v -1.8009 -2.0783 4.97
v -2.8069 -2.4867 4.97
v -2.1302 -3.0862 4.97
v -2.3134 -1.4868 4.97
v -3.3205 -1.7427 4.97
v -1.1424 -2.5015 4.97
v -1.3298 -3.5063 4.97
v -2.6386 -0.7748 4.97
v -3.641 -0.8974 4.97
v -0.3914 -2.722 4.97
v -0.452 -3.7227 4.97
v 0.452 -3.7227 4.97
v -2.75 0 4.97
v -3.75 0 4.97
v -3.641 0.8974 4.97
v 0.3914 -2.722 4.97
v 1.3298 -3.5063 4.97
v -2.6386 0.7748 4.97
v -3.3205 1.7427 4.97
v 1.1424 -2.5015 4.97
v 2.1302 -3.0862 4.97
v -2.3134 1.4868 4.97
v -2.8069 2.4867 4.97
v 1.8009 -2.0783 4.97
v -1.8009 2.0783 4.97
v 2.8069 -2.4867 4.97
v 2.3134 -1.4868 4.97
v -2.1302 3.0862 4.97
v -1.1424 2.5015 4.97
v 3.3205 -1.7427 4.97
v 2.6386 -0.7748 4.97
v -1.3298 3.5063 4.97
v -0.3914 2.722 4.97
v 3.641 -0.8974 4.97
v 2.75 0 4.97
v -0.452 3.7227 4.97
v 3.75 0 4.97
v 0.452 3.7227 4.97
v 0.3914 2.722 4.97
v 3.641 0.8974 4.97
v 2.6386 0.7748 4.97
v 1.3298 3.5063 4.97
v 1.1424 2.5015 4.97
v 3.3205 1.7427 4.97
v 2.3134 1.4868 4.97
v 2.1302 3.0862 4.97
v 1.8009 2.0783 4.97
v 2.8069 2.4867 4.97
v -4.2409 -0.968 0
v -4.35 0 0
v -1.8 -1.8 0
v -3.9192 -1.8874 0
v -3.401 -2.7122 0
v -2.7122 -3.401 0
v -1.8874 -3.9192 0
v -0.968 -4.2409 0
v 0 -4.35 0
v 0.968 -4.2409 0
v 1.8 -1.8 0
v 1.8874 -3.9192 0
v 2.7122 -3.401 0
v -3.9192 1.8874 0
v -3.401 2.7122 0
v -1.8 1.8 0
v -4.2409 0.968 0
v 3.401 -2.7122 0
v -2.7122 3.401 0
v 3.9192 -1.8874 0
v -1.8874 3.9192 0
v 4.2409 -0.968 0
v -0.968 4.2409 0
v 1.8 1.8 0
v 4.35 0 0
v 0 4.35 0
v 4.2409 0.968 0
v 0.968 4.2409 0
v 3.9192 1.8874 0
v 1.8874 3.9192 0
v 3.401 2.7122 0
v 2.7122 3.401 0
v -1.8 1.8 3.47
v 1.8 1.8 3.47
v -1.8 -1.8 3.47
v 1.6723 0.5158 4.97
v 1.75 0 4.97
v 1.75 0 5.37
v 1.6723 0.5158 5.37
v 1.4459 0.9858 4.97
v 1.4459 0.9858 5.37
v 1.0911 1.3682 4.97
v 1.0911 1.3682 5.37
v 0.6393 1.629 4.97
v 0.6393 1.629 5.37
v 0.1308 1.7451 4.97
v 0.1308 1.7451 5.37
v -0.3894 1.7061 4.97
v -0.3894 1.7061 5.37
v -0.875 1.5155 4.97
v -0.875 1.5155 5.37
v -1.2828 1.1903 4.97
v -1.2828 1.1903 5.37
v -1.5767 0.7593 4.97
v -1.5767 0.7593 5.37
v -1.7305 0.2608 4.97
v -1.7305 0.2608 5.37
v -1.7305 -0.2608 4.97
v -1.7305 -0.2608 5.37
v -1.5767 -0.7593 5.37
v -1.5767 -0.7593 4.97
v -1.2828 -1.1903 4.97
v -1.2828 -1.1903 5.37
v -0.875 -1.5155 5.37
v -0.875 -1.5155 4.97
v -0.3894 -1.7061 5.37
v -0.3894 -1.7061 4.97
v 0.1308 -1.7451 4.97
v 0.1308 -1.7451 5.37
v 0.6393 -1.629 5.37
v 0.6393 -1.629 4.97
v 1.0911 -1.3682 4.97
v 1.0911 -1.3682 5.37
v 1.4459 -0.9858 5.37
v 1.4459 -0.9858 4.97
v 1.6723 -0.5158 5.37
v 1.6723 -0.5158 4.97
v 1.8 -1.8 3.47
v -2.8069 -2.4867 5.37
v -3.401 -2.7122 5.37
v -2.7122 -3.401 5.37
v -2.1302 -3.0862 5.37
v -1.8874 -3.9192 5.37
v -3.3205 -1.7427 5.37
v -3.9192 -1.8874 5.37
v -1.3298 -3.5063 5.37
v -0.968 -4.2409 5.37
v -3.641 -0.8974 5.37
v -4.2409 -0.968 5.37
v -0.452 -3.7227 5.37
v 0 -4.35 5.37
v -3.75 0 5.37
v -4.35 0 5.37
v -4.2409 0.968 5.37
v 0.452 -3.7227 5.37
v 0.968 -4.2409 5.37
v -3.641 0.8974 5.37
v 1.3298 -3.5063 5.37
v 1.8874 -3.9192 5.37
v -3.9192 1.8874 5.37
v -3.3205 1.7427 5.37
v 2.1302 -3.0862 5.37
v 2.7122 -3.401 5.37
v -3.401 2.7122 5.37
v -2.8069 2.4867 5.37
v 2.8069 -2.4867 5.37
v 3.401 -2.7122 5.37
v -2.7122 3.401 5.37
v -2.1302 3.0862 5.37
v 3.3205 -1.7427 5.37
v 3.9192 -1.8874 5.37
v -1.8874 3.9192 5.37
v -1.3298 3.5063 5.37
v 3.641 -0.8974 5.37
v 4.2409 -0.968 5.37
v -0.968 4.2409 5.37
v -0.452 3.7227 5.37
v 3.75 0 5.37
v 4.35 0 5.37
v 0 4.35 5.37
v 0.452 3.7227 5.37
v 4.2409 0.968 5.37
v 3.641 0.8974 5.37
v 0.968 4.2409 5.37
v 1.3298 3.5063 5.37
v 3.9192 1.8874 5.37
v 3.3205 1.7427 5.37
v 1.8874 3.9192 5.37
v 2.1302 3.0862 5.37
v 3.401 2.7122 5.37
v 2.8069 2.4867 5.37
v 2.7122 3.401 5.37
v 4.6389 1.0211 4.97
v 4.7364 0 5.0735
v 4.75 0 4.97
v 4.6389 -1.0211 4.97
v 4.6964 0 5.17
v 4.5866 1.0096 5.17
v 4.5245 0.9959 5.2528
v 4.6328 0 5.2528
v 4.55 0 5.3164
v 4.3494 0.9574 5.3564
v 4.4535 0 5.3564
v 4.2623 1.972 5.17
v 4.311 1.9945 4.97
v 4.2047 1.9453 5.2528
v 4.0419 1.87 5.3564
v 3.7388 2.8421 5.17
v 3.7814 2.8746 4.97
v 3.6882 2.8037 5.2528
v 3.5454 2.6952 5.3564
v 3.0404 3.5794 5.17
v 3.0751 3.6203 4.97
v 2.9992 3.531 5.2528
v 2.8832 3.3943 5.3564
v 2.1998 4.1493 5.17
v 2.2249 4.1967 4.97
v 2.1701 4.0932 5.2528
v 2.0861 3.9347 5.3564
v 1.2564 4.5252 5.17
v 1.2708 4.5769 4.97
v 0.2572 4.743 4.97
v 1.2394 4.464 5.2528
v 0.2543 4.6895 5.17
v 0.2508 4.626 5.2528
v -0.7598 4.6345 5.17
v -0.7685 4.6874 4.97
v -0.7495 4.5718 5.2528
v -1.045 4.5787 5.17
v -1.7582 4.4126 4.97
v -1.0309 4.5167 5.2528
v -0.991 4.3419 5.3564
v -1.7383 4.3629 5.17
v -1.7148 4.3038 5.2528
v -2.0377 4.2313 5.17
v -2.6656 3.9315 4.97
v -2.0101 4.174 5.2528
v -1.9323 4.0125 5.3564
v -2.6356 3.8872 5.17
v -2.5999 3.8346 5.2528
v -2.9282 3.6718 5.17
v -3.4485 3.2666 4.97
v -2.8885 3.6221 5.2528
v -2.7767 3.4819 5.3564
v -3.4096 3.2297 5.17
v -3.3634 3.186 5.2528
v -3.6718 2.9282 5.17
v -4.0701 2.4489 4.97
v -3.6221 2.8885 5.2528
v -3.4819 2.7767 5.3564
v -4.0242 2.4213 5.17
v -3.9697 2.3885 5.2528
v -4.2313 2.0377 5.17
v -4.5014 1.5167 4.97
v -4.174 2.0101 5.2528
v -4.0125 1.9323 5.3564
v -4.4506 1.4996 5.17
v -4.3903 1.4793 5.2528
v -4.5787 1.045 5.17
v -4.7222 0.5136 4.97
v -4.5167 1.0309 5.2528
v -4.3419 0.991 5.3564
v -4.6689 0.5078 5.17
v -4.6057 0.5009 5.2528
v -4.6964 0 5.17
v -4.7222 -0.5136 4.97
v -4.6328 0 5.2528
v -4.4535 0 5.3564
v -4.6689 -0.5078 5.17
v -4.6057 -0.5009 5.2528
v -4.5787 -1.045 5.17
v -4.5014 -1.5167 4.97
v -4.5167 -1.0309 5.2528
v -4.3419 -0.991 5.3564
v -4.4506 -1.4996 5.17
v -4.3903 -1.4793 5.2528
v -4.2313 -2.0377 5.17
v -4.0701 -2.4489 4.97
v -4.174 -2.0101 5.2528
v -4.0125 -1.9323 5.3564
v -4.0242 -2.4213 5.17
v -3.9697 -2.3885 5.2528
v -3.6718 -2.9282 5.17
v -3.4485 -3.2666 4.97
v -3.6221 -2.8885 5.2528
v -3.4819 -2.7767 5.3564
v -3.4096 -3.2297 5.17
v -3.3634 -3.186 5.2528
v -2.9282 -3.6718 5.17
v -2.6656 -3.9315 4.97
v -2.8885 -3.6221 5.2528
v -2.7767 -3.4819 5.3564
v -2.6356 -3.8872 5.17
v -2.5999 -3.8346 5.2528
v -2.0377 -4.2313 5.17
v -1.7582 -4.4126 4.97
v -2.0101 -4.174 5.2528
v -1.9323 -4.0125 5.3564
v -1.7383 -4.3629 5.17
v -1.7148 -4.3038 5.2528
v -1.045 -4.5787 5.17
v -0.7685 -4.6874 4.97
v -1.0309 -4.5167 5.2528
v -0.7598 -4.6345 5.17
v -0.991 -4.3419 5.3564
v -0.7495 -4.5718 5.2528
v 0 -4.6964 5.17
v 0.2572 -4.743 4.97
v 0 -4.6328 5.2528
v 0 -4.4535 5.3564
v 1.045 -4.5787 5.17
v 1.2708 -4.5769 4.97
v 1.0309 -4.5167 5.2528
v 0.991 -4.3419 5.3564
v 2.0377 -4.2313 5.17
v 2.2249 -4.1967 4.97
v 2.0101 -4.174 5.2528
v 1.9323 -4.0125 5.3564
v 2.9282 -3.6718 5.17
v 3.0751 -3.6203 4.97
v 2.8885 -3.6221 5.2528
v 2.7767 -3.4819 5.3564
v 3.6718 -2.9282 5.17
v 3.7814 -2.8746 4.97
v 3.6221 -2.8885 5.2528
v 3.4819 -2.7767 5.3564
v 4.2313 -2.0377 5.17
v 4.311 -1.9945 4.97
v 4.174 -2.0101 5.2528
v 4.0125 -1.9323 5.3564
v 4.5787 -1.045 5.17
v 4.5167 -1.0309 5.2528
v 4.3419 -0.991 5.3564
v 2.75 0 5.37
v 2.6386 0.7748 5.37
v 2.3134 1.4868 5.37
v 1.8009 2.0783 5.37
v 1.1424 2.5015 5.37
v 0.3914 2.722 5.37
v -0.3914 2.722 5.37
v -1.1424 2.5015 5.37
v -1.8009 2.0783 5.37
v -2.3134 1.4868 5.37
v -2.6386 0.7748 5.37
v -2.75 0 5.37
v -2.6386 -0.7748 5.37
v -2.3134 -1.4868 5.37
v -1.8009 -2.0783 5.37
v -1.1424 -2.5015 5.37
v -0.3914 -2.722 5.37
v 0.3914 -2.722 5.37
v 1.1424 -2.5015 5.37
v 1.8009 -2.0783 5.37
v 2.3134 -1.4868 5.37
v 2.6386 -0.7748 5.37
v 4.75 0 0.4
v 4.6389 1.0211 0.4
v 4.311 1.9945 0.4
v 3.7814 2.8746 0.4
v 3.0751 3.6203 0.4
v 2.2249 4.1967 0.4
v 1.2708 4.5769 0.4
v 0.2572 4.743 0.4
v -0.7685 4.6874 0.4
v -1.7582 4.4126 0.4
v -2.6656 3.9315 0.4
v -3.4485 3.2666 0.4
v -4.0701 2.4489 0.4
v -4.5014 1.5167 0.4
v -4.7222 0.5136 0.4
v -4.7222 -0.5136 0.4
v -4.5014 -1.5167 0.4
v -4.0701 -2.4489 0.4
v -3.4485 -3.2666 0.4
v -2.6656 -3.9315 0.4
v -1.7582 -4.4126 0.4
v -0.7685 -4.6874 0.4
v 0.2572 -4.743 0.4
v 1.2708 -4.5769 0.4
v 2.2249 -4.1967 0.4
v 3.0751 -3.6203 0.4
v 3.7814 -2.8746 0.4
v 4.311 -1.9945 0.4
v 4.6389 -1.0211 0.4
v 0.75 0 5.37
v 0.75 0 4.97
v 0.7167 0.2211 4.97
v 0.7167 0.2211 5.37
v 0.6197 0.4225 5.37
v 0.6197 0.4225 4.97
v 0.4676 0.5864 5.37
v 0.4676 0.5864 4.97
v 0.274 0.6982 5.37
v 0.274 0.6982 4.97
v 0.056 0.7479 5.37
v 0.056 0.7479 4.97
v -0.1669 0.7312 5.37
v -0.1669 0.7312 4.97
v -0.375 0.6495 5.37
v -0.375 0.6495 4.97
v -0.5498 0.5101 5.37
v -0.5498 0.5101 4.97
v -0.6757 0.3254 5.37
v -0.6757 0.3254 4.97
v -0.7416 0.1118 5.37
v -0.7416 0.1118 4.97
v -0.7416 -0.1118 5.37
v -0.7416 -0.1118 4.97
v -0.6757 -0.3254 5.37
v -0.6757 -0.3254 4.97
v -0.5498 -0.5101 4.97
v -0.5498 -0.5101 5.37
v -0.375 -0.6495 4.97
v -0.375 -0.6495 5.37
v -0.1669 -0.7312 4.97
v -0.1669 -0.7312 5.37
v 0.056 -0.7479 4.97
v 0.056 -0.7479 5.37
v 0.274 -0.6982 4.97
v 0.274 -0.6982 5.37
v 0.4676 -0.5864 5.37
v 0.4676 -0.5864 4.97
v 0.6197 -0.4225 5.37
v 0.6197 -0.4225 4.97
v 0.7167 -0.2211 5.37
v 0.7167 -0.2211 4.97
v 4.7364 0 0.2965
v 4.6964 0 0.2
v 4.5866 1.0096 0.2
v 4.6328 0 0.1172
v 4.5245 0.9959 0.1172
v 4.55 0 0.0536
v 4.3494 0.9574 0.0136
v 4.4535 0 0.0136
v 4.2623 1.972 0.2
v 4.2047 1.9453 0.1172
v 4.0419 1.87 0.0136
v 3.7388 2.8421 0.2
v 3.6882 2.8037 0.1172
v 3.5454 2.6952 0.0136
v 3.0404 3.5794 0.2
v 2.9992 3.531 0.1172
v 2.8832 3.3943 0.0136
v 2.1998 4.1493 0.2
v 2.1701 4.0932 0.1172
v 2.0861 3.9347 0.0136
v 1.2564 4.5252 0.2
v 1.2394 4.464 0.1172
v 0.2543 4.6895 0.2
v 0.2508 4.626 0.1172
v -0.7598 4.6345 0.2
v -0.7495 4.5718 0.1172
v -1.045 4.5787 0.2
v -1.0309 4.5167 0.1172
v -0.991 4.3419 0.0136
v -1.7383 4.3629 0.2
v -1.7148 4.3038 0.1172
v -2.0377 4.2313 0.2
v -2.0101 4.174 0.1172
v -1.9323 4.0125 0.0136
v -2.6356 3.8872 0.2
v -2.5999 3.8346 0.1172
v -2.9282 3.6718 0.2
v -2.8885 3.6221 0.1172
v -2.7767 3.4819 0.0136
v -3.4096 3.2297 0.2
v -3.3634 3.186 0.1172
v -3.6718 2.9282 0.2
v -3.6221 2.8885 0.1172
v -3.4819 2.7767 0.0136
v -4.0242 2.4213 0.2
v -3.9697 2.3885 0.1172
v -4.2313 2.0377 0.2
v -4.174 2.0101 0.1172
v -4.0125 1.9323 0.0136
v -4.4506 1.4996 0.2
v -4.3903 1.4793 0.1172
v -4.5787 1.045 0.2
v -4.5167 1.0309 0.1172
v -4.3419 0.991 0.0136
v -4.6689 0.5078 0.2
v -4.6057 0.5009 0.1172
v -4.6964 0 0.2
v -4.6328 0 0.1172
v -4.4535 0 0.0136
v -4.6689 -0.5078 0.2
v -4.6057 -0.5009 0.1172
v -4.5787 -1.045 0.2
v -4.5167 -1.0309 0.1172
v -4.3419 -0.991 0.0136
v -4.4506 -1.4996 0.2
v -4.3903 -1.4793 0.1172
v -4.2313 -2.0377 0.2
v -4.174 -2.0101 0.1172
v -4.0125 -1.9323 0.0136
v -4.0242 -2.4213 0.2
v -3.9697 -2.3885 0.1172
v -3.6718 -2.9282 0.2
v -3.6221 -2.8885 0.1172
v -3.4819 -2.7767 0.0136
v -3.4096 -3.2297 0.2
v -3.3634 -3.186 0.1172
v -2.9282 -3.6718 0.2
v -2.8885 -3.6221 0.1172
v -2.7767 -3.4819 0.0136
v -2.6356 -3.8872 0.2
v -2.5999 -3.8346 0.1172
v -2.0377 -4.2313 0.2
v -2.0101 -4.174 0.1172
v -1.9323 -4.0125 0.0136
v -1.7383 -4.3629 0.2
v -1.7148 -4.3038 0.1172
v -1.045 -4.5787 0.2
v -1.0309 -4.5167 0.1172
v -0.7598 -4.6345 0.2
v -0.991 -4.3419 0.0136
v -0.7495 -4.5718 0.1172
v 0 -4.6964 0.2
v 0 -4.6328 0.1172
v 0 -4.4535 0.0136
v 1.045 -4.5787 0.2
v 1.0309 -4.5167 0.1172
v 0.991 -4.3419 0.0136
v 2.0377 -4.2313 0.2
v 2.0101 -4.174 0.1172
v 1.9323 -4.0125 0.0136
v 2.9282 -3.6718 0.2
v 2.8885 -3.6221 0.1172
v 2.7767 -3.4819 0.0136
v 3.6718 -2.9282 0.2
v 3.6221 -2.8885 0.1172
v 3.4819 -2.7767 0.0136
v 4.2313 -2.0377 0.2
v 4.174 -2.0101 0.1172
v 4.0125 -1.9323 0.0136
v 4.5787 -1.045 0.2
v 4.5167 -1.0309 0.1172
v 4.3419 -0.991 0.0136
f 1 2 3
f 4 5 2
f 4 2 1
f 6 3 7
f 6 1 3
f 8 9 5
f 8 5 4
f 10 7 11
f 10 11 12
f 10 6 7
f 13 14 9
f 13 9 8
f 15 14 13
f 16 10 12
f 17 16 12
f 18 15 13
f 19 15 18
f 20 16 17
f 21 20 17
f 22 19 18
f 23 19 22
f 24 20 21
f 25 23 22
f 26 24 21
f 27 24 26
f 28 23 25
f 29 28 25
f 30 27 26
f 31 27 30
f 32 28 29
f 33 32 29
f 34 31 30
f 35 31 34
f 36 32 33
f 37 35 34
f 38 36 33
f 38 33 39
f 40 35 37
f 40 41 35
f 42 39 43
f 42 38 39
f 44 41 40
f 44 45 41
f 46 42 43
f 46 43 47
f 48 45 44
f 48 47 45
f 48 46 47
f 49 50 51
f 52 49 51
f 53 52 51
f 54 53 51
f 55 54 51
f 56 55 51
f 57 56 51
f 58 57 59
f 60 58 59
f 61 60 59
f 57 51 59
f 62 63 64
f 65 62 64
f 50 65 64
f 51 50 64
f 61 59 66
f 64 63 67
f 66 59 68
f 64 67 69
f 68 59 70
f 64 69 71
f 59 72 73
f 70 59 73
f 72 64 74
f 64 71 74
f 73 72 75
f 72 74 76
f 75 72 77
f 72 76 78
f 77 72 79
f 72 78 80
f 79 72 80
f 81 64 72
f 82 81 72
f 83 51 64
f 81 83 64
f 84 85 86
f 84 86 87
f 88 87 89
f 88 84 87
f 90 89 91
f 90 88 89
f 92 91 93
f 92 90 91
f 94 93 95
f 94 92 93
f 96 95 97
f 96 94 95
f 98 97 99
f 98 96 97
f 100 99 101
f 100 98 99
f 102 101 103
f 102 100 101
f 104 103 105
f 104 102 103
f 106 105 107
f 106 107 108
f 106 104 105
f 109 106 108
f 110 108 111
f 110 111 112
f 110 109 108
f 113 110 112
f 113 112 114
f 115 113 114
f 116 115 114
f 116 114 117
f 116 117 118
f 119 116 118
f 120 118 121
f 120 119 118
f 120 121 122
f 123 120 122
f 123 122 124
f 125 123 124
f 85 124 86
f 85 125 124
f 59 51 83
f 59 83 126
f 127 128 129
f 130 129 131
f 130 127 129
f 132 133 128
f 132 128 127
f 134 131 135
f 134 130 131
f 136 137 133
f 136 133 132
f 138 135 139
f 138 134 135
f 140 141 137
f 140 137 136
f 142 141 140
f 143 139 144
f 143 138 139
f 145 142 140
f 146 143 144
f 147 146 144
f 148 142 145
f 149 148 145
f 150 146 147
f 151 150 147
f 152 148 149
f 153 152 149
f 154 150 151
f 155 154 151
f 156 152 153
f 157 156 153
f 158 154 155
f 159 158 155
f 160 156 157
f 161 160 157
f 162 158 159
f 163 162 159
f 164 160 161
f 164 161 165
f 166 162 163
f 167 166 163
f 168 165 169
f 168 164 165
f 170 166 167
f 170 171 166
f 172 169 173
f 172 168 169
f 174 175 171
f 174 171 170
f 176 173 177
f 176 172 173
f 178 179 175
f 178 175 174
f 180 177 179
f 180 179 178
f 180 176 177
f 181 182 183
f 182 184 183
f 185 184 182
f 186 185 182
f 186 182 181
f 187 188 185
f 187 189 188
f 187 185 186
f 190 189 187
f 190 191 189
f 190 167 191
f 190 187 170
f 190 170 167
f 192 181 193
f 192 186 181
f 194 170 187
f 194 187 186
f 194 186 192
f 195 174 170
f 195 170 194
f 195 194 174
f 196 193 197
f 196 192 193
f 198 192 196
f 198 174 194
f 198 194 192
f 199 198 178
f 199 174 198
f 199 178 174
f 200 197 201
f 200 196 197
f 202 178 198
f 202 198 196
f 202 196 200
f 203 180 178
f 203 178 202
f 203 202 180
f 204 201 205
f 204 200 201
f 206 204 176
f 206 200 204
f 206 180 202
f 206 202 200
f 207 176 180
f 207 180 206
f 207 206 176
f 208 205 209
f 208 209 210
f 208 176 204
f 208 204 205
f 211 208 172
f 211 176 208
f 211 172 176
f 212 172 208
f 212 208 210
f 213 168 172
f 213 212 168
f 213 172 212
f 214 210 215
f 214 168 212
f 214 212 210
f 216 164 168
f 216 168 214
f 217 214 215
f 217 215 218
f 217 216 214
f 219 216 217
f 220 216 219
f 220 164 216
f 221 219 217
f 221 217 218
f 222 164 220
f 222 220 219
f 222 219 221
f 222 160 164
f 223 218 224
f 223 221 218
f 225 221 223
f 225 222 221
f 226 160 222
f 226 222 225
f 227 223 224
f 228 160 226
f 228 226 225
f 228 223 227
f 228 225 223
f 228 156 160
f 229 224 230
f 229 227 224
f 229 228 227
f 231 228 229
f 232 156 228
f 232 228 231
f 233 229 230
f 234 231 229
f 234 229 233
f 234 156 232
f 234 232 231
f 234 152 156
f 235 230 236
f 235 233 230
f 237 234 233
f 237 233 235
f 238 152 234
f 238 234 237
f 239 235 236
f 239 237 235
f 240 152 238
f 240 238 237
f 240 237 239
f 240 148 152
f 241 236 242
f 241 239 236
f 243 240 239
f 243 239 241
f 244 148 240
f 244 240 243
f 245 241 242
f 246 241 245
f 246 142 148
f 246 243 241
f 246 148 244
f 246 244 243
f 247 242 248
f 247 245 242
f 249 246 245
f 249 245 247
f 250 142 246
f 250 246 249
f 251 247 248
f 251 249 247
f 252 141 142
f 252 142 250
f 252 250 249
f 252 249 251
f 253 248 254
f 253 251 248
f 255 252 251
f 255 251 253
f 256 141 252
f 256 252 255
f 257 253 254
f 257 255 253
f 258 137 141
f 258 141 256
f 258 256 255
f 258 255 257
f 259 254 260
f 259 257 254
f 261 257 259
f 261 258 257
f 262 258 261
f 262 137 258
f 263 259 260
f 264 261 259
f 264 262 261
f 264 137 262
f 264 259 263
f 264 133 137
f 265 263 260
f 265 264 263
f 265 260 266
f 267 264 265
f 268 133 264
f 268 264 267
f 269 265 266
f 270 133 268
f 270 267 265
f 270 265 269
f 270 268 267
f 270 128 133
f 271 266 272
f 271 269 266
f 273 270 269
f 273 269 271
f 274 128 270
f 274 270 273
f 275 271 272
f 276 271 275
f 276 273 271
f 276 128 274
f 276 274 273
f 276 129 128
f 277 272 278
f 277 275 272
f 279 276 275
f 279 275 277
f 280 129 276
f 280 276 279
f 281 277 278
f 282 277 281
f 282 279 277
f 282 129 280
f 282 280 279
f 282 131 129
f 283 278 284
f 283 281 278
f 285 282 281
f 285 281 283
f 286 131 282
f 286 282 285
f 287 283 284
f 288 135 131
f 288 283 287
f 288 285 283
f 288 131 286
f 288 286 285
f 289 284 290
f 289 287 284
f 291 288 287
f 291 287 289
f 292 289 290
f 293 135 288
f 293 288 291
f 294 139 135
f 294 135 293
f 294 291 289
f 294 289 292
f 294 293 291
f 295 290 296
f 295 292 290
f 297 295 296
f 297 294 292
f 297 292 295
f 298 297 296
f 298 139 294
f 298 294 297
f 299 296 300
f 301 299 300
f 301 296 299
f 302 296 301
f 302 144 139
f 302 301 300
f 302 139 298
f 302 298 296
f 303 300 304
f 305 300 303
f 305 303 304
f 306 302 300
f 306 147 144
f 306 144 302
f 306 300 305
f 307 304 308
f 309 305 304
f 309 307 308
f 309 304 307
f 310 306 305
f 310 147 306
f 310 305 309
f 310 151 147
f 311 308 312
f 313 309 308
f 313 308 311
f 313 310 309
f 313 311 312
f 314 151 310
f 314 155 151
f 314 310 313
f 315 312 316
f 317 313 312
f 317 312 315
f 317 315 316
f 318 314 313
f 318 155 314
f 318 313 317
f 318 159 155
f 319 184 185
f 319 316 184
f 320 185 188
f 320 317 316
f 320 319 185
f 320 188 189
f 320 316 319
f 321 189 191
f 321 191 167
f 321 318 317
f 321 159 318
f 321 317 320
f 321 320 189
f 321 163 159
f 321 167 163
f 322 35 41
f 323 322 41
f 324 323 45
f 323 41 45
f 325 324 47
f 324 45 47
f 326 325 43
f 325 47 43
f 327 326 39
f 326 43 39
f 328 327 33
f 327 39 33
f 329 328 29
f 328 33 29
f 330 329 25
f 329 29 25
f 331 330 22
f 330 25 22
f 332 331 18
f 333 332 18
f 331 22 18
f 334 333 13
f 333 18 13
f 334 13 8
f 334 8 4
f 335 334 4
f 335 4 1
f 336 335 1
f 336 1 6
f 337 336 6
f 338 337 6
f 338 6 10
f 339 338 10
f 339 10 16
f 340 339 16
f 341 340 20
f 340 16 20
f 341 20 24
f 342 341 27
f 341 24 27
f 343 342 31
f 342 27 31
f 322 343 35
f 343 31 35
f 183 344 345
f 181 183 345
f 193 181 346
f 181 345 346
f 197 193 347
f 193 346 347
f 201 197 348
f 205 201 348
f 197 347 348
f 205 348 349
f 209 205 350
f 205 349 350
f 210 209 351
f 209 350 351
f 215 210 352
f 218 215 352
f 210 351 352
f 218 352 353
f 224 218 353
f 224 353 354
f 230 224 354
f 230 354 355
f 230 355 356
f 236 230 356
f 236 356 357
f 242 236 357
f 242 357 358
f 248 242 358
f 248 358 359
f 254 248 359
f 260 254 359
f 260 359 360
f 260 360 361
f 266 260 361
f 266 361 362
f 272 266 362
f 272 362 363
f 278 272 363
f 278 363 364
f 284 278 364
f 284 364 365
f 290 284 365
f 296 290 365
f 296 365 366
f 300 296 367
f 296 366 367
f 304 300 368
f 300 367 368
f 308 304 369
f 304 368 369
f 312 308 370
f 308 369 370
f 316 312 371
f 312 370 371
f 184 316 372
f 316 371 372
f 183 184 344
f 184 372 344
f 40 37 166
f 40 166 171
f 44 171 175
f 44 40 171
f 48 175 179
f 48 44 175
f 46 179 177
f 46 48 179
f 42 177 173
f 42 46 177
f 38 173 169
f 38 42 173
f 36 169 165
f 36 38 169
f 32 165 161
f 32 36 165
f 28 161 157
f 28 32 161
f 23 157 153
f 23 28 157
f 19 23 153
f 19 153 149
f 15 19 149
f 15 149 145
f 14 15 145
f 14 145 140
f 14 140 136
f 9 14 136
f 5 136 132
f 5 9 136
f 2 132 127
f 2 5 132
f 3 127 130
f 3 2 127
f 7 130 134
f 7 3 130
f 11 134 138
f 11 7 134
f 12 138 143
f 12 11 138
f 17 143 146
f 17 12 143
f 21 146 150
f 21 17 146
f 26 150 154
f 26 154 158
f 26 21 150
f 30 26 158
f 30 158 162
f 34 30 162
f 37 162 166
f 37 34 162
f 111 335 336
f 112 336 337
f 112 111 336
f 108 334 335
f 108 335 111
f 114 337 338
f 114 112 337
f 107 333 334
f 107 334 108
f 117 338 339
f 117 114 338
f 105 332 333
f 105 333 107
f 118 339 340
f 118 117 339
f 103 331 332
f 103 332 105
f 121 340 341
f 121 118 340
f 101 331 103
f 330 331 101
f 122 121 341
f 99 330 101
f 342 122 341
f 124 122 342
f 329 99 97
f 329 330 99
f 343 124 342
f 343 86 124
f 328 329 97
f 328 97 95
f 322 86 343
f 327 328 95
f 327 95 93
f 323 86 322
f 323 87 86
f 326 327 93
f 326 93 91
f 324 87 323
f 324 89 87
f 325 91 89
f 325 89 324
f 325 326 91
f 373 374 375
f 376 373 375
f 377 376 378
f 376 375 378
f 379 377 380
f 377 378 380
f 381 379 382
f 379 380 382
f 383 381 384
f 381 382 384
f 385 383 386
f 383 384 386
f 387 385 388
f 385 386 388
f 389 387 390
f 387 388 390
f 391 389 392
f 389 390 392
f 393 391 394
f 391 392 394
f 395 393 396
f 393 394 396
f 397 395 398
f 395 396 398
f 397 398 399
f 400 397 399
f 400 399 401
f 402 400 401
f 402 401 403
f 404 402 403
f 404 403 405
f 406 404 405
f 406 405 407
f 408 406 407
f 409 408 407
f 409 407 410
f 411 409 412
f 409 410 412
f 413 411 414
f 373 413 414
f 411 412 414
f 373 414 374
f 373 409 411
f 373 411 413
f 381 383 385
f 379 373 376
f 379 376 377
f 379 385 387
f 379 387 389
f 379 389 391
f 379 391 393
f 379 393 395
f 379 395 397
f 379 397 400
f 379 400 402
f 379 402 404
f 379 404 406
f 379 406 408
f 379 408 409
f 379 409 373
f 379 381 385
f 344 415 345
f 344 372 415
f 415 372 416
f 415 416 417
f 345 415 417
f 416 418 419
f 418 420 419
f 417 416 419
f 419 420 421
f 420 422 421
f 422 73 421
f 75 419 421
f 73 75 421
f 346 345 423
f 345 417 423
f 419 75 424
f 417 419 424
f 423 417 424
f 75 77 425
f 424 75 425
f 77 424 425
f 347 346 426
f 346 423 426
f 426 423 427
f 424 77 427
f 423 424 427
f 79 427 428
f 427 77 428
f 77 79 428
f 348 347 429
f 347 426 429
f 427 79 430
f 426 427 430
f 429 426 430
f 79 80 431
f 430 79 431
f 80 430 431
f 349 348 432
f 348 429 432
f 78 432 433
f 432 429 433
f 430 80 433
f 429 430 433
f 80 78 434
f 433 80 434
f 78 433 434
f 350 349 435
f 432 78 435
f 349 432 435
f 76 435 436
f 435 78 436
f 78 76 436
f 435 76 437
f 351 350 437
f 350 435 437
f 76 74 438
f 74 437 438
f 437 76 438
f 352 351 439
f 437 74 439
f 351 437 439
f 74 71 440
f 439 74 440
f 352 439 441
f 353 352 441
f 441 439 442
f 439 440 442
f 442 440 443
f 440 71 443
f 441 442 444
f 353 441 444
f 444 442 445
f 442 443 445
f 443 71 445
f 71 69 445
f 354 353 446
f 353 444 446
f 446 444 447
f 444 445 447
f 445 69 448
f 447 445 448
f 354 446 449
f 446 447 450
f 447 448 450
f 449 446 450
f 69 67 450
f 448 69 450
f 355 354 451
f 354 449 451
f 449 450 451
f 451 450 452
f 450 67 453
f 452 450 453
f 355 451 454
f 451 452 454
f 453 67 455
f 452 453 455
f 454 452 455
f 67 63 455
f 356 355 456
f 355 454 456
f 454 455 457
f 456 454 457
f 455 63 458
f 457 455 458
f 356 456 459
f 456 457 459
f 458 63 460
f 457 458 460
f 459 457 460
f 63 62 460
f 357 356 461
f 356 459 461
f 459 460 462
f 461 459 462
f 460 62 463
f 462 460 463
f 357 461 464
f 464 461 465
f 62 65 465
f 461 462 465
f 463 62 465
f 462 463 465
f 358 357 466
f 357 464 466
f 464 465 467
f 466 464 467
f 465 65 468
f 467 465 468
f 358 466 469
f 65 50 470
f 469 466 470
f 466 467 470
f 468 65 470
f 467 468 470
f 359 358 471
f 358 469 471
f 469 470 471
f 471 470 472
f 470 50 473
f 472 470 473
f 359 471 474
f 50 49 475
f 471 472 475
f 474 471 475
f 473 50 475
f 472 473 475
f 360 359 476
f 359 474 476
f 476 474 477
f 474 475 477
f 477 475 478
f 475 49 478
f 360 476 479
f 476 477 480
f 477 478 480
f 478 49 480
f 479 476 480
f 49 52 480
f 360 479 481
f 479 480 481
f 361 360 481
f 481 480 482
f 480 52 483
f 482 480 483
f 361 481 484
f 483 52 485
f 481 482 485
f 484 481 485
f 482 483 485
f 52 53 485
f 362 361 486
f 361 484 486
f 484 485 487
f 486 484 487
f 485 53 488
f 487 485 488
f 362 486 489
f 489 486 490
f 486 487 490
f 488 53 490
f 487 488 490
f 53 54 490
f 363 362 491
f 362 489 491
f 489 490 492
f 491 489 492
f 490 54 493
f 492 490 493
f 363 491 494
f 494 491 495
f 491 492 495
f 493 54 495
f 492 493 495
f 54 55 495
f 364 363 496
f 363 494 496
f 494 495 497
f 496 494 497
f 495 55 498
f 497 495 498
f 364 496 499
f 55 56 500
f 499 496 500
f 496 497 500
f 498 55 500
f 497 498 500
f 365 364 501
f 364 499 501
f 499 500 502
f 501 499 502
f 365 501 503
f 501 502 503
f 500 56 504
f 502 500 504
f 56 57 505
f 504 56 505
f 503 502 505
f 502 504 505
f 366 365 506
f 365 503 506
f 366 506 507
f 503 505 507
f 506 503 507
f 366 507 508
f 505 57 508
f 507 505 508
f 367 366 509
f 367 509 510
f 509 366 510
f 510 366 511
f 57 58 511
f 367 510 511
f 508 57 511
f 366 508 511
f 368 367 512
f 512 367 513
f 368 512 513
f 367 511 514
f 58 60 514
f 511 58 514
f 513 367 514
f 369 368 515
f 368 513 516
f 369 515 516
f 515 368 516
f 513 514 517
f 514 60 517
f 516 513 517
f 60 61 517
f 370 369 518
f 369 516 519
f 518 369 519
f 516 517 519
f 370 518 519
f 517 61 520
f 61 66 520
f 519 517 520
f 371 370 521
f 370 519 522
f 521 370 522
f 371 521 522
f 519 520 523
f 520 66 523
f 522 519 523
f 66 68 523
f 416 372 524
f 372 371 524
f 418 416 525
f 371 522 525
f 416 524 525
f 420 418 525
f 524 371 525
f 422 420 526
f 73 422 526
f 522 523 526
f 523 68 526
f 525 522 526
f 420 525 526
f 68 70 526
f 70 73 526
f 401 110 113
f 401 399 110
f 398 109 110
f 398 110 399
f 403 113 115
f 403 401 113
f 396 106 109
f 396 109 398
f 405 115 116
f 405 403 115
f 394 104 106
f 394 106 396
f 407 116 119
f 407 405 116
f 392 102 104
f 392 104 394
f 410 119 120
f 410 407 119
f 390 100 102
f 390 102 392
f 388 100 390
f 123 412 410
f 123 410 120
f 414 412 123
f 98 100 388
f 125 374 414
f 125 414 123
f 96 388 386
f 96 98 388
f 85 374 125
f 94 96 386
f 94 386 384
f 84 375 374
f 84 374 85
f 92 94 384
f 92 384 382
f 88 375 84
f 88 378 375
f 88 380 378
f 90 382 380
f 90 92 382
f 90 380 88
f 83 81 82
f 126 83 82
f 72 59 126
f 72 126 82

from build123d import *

# Parameters (mm, degrees)
F0_R     = 4.75
F0_W     = 3.6
F0_H     = 3.6
F1_DEPTH = 3.47
F2_R     = 4.75
F2_W     = 3.6
F2_H     = 3.6
F3_DEPTH = 1.5
F4_R     = 4.75
F4_R_2   = 3.75
F4_R_3   = 2.75
F4_R_4   = 1.75
F4_R_5   = 0.75
F5_DEPTH = 0.4
F6_R     = 0.4


with BuildPart() as f1:
    # F0 (on Top) → F1 (new body)
    with BuildSketch(Plane.XY):
        Circle(F0_R)
        Rectangle(F0_W, F0_H, mode=Mode.SUBTRACT)
    extrude(amount=F1_DEPTH)

    # F2 (on face) → F3 (join)
    with BuildSketch(Plane.XY.offset(3.47)):
        Circle(F2_R)
        Rectangle(F2_W, F2_H, mode=Mode.SUBTRACT)
        Rectangle(F2_W, F2_H)
    extrude(amount=F3_DEPTH)

    # F4 (on face) → F5 (join)
    with BuildSketch(Plane.XY.offset(4.97)):
        Circle(F4_R)
        Circle(F4_R_2, mode=Mode.SUBTRACT)
        Circle(F4_R_3)
        Circle(F4_R_4, mode=Mode.SUBTRACT)
        Circle(F4_R_5)
    extrude(amount=F5_DEPTH)

    # F6
    f6_edges = [f1.edges().sort_by_distance(p)[0] for p in [
        (-4.75, 0, 5.37),
        (-4.75, 0, 0),
    ]]
    fillet(f6_edges, radius=F6_R)


solid = f1.part
